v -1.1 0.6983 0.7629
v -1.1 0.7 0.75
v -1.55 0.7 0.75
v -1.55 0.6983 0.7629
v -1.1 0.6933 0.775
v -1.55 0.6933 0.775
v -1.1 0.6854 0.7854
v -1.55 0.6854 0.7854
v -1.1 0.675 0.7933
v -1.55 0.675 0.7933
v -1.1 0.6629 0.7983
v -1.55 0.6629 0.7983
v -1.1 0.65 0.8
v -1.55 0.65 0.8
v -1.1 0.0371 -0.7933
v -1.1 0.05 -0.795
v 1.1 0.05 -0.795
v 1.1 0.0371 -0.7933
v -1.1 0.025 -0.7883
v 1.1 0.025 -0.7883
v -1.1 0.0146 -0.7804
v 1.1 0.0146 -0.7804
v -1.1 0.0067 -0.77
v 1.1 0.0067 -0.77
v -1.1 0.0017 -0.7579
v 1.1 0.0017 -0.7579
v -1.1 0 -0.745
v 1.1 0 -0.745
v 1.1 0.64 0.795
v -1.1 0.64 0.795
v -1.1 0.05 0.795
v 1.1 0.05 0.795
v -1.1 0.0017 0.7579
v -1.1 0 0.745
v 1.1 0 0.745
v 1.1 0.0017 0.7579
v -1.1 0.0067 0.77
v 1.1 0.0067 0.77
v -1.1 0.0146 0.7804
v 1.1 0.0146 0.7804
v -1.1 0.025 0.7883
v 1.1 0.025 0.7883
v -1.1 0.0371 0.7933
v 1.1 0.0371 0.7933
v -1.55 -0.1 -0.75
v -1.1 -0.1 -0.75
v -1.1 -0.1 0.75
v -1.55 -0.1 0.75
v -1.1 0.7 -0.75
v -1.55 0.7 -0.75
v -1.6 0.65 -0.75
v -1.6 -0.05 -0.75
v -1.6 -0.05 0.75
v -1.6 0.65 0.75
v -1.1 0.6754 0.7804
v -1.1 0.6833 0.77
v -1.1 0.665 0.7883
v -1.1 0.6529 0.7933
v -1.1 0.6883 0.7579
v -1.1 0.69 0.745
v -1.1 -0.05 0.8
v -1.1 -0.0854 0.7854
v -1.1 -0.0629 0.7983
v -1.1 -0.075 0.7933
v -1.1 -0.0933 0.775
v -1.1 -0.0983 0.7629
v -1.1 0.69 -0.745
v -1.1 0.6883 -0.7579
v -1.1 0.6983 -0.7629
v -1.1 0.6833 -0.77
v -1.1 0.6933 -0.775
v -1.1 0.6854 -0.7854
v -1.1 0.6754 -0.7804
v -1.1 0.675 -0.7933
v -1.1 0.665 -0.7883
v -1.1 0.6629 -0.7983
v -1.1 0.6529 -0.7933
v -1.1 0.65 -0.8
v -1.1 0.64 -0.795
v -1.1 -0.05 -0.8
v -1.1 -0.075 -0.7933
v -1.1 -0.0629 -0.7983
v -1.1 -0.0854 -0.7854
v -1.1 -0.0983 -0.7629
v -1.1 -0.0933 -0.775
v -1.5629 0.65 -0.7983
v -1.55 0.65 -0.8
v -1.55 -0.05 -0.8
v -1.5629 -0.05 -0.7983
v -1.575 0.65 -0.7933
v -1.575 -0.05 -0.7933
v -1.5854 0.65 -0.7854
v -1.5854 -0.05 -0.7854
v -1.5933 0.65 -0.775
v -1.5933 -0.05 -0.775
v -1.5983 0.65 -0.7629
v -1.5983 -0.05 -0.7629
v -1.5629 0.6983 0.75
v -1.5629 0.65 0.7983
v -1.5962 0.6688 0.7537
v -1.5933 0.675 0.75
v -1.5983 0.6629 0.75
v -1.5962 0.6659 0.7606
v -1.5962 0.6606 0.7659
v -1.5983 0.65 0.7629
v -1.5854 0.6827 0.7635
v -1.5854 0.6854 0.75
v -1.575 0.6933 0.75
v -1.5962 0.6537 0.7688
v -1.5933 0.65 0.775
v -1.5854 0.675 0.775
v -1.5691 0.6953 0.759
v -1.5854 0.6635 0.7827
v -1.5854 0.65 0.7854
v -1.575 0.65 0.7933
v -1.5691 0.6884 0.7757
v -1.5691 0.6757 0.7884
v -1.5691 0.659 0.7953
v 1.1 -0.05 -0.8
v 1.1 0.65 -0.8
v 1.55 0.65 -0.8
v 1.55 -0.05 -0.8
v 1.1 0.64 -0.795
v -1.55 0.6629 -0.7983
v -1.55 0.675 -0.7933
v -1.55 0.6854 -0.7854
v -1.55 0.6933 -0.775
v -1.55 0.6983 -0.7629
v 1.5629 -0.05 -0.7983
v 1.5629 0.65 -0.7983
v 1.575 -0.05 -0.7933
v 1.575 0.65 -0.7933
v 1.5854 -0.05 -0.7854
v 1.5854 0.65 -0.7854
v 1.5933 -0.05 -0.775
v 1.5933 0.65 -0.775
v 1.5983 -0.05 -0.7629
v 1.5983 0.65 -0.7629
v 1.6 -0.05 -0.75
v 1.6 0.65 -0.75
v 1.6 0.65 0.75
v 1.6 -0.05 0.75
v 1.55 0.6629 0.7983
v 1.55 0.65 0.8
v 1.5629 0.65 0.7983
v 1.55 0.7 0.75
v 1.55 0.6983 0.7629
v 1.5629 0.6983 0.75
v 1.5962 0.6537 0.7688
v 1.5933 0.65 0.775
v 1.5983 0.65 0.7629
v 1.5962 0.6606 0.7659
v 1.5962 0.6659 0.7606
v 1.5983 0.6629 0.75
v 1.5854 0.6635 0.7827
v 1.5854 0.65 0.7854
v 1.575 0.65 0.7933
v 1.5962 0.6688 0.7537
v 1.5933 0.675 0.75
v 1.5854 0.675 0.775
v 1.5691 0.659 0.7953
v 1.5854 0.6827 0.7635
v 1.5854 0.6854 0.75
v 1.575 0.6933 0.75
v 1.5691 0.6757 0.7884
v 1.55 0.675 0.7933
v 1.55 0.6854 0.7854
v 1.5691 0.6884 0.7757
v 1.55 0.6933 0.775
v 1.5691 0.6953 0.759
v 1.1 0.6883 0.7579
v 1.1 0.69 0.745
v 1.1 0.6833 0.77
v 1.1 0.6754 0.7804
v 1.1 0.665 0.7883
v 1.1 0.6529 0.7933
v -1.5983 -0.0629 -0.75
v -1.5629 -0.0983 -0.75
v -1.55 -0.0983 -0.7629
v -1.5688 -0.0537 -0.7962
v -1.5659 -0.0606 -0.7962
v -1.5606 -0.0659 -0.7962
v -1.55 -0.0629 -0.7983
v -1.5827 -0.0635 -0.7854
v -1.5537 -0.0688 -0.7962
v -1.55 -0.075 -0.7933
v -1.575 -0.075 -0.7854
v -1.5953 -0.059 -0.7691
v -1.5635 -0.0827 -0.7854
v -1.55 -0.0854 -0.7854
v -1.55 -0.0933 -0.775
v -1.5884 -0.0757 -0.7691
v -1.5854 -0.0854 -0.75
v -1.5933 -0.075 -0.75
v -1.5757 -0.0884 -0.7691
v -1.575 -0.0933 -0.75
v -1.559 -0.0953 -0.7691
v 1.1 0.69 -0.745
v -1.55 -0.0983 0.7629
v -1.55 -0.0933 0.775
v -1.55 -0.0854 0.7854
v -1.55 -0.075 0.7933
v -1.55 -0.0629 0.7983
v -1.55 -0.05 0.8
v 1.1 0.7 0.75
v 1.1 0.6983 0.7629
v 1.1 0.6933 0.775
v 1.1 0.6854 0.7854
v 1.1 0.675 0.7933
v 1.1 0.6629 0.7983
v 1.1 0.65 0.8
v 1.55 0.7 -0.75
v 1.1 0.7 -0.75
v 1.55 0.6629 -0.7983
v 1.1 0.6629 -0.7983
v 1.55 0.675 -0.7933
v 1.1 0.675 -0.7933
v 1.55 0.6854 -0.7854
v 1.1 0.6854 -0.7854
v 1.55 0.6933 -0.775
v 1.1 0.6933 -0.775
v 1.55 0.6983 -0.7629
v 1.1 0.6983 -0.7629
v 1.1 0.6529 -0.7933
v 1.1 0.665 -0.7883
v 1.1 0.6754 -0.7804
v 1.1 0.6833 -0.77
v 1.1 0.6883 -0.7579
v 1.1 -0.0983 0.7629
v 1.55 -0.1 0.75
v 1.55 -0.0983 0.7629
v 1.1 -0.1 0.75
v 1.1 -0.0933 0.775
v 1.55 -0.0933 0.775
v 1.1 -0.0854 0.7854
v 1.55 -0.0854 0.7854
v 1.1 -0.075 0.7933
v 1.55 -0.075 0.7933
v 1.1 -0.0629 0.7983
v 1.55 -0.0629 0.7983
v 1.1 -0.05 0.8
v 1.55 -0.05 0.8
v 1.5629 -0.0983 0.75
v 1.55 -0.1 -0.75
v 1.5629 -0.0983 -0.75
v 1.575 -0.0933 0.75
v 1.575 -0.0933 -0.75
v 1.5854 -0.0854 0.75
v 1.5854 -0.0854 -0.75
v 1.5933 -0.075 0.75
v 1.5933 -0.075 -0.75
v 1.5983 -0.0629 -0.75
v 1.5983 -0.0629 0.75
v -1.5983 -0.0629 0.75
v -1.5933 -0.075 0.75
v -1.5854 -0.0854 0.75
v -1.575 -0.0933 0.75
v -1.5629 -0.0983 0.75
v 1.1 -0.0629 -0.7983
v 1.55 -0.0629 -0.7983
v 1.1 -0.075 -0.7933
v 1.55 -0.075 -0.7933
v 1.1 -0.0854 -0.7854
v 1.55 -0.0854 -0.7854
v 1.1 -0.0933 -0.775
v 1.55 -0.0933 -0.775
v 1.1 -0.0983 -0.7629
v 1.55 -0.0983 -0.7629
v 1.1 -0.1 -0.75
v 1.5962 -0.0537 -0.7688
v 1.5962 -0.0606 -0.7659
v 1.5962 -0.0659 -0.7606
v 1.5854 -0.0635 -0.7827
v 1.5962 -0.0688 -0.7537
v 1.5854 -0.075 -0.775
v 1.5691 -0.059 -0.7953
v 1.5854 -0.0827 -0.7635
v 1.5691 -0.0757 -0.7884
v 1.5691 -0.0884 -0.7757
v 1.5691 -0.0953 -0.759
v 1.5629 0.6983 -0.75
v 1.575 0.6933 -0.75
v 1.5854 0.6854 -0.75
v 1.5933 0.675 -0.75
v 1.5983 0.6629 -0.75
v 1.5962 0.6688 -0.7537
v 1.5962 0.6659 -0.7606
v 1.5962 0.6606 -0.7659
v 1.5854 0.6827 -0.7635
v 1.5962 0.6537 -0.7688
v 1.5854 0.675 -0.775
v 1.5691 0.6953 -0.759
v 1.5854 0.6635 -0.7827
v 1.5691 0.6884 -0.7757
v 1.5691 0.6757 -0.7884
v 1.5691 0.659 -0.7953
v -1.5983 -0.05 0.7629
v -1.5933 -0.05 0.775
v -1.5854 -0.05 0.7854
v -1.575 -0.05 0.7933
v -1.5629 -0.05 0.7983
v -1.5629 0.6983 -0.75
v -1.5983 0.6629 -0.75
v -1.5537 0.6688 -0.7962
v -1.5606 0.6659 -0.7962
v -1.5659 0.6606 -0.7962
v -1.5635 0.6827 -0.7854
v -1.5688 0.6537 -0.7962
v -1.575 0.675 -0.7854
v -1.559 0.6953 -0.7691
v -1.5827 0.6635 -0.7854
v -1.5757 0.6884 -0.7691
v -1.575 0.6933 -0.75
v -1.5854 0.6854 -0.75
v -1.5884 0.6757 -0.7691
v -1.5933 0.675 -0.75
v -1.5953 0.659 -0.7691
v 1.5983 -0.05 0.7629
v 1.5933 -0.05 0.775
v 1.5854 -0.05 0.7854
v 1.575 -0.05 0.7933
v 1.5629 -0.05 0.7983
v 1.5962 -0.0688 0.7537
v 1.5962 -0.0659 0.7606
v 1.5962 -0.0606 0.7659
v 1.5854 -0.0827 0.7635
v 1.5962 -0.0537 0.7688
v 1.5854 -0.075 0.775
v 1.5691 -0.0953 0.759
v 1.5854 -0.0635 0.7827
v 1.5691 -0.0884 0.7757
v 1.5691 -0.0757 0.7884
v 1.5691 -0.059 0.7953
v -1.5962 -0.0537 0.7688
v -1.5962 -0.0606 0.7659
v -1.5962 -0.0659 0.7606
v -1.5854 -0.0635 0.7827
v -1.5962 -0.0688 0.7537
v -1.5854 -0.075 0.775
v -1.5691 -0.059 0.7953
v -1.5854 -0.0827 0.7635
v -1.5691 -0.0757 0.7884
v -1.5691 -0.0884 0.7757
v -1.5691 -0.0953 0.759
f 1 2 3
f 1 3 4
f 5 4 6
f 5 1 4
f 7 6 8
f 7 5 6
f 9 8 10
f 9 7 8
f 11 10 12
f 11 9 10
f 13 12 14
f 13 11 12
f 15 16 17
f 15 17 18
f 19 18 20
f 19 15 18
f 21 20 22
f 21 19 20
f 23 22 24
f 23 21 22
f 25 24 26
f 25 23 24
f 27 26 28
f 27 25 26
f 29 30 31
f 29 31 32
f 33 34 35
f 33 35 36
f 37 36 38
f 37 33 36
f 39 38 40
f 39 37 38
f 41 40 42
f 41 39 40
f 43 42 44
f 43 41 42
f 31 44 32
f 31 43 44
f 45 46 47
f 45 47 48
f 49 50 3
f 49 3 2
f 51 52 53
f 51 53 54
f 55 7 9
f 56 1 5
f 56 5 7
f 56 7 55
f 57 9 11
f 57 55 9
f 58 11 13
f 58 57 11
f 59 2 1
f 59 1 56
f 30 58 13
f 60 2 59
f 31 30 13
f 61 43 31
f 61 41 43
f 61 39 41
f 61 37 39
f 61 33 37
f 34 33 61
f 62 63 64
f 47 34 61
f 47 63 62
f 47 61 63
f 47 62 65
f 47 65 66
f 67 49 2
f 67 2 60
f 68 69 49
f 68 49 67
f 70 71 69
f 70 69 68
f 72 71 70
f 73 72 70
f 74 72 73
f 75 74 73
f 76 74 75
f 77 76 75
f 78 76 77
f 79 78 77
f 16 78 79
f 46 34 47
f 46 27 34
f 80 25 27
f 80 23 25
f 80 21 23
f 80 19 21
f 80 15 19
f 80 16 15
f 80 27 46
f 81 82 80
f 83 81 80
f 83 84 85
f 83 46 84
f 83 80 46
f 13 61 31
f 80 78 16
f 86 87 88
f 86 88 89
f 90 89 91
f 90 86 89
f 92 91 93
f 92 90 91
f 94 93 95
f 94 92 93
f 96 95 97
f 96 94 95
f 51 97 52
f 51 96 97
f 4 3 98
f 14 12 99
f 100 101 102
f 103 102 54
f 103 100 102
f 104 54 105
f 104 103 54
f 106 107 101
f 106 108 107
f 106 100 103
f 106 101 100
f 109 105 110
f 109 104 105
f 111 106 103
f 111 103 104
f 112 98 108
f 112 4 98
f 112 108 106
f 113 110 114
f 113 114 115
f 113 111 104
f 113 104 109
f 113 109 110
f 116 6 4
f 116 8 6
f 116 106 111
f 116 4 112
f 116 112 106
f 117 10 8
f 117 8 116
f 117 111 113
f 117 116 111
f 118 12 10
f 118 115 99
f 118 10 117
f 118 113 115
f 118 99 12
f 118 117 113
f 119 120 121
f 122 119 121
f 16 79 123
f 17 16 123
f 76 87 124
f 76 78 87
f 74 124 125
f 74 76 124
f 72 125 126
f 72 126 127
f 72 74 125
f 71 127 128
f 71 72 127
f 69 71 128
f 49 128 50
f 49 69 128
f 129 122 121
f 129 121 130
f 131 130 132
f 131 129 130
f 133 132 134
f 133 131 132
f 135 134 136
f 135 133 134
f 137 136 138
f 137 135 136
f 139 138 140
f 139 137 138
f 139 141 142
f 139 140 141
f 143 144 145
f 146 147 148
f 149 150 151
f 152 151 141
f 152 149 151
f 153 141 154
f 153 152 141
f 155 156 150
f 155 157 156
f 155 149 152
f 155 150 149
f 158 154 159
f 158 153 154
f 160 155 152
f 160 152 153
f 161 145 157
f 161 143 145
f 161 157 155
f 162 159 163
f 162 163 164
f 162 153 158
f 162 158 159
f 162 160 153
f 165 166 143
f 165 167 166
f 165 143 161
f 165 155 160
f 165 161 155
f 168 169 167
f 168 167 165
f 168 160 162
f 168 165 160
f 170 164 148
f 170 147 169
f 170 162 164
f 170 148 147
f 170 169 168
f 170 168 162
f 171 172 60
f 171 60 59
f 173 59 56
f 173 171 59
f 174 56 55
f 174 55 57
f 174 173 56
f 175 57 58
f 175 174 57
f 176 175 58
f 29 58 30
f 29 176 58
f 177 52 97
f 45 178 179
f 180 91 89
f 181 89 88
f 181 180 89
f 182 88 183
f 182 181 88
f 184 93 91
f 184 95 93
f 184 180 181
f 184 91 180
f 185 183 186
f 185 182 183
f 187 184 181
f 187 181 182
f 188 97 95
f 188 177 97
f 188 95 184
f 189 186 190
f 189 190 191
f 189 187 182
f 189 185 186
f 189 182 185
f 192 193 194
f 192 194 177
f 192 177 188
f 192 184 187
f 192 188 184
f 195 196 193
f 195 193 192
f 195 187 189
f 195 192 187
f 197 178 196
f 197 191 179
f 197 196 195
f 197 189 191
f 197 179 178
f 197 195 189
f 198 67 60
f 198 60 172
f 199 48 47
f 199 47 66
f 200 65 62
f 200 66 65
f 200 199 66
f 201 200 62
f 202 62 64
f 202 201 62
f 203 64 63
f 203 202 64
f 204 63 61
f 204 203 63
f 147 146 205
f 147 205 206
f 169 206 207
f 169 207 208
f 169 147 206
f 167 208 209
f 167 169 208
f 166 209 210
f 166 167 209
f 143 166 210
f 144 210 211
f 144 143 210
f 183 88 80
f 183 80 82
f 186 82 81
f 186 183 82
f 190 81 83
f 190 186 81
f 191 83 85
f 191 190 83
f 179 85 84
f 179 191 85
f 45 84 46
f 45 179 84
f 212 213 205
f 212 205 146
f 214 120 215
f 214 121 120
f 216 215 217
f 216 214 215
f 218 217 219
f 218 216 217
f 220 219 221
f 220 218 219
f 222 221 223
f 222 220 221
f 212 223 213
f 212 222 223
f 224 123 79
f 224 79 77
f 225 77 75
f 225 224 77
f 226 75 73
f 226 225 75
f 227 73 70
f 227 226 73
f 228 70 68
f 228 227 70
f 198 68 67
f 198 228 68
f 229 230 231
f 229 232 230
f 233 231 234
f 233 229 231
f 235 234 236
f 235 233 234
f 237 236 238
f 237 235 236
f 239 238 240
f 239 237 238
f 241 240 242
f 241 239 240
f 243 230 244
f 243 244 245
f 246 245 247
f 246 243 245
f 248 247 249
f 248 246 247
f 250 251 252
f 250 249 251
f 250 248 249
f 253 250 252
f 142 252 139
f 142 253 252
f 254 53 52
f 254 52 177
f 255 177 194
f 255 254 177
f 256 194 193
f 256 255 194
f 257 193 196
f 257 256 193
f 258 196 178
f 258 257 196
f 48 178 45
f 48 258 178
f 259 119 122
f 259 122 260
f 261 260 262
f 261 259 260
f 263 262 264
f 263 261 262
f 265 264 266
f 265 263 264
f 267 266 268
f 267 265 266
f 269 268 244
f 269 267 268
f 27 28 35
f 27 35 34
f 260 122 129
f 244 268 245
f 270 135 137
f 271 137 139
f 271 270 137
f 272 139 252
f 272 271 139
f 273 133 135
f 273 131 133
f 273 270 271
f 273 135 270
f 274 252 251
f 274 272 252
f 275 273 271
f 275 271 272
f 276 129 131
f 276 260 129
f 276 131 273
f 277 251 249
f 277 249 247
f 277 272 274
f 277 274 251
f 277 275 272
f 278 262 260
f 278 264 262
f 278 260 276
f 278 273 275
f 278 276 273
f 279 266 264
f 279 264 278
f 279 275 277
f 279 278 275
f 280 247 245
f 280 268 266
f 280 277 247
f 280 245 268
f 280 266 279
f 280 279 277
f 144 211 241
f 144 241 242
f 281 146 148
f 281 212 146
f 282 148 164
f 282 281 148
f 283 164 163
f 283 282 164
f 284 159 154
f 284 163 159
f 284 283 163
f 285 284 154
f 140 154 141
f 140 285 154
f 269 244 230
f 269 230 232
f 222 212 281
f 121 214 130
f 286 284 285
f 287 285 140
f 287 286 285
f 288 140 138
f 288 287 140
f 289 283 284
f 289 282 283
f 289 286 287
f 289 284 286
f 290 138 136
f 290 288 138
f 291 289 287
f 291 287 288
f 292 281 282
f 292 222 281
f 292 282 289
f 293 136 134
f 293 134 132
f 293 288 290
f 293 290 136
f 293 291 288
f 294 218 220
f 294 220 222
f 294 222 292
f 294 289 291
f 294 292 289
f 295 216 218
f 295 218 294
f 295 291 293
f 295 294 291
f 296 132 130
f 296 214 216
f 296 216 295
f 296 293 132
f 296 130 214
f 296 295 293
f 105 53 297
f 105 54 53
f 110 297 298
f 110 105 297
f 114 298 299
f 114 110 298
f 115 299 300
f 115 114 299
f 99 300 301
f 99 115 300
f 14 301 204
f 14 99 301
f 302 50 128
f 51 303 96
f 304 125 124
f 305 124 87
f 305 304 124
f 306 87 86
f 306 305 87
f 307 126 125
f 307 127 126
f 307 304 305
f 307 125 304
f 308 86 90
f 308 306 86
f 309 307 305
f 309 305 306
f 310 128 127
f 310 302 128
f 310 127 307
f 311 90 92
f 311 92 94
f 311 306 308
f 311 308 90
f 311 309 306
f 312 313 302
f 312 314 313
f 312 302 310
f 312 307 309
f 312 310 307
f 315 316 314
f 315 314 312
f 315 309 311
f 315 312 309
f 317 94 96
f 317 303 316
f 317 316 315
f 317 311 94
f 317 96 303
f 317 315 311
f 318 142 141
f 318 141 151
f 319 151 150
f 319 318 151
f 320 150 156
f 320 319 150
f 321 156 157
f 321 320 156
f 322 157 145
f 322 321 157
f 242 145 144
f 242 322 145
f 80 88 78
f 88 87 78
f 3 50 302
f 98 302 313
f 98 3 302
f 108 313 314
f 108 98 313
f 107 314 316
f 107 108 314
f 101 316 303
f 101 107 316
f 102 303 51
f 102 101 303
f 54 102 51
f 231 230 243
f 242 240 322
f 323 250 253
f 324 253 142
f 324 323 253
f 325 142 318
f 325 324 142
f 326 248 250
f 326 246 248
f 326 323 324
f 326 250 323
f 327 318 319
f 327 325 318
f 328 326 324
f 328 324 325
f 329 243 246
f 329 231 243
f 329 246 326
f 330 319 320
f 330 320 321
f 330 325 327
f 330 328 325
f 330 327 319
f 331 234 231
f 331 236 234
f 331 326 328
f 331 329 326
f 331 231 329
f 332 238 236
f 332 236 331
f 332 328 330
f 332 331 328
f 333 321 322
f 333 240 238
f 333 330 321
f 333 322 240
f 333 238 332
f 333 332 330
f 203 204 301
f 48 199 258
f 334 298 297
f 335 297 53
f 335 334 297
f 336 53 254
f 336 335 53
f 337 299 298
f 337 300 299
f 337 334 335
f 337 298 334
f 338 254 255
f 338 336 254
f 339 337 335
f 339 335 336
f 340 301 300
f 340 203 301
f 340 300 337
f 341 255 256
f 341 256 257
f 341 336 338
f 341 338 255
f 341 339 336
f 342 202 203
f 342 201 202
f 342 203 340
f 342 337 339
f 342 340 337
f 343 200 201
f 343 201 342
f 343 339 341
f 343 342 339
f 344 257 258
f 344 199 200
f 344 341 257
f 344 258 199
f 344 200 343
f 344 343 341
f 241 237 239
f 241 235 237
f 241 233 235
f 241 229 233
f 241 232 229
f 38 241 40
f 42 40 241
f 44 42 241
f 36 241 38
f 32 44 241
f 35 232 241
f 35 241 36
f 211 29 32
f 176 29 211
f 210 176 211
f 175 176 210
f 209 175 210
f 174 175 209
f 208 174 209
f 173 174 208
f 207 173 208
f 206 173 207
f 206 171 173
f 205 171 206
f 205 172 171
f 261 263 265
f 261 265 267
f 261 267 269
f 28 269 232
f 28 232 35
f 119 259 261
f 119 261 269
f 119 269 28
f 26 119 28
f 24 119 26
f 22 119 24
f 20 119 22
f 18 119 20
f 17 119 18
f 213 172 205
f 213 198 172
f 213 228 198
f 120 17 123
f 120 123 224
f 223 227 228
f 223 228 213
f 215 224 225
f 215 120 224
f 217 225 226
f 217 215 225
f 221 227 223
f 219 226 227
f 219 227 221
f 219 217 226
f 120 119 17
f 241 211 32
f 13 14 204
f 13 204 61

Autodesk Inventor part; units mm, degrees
ref_plane "YZ Plane" through (0, 0, 0) normal (1, 0, 0) x (0, 1, 0)
ref_plane "XZ Plane" through (0, 0, 0) normal (0, 1, 0) x (-1, 0, 0)
ref_plane "XY Plane" through (0, 0, 0) normal (0, 0, 1) x (1, 0, 0)
sketch "Sketch1" plane through (0, 0, 0) normal (0, 0, 1) x (1, 0, 0)
  line L0 (-1.6, 0.7) -> (-1.1, 0.7)
  line L1 (-1.1, 0.7) -> (-1.1, -0.1)
  line L2 (-1.1, -0.1) -> (-1.6, -0.1)
  line L3 (-1.6, -0.1) -> (-1.6, 0.7)
  line L4 (-1.1, 0.69) -> (1.1, 0.69)
  line L5 (1.1, 0.69) -> (1.1, 0)
  line L6 (1.1, 0) -> (-1.1, 0)
  line L7 (-1.1, 0) -> (-1.1, 0.69)
  line L8 (1.1, 0.7) -> (1.6, 0.7)
  line L9 (1.6, 0.7) -> (1.6, -0.1)
  line L10 (1.6, -0.1) -> (1.1, -0.1)
  line L11 (1.1, -0.1) -> (1.1, 0.7)
  point P0 (0, 0)
  point P1 (0, 0.69)
  point P2 (0, 0)
  dimension "d0" = 3.2
  dimension "d1" = 0.8
  dimension "d2" = 0.5
  dimension "d3" = 0.1
  dimension "d6" = 0.01
extrude "Extrusion1" add sketch "Sketch1" along normal mid plane 1.6 contours L0 L1 L2 L3 | L11 L8 L9 L10 L5
extrude "Extrusion2" add sketch "Sketch1" along normal mid plane 1.59 contours L4 L5 L6 L1
fillet "Fillet1" radius 0.05 20 edges at (0, 0.69, 0.795) (0, 0, 0.795) (0, 0.69, -0.795) (0, 0, -0.795) (-1.35, 0.7, 0.8) (-1.35, -0.1, 0.8) (1.35, -0.1, 0.8) (1.35, 0.7, 0.8) (1.35, 0.7, -0.8) (1.35, -0.1, -0.8) (1.6, 0.3, -0.8) (1.6, -0.1, 0) (1.6, 0.3, 0.8) (1.6, 0.7, 0) (-1.6, 0.7, 0) (-1.6, 0.3, 0.8) (-1.6, -0.1, 0) (-1.35, 0.7, -0.8) (-1.35, -0.1, -0.8) (-1.6, 0.3, -0.8)
properties part number "Capacitor_3216-1.6mm" material "Copper"
